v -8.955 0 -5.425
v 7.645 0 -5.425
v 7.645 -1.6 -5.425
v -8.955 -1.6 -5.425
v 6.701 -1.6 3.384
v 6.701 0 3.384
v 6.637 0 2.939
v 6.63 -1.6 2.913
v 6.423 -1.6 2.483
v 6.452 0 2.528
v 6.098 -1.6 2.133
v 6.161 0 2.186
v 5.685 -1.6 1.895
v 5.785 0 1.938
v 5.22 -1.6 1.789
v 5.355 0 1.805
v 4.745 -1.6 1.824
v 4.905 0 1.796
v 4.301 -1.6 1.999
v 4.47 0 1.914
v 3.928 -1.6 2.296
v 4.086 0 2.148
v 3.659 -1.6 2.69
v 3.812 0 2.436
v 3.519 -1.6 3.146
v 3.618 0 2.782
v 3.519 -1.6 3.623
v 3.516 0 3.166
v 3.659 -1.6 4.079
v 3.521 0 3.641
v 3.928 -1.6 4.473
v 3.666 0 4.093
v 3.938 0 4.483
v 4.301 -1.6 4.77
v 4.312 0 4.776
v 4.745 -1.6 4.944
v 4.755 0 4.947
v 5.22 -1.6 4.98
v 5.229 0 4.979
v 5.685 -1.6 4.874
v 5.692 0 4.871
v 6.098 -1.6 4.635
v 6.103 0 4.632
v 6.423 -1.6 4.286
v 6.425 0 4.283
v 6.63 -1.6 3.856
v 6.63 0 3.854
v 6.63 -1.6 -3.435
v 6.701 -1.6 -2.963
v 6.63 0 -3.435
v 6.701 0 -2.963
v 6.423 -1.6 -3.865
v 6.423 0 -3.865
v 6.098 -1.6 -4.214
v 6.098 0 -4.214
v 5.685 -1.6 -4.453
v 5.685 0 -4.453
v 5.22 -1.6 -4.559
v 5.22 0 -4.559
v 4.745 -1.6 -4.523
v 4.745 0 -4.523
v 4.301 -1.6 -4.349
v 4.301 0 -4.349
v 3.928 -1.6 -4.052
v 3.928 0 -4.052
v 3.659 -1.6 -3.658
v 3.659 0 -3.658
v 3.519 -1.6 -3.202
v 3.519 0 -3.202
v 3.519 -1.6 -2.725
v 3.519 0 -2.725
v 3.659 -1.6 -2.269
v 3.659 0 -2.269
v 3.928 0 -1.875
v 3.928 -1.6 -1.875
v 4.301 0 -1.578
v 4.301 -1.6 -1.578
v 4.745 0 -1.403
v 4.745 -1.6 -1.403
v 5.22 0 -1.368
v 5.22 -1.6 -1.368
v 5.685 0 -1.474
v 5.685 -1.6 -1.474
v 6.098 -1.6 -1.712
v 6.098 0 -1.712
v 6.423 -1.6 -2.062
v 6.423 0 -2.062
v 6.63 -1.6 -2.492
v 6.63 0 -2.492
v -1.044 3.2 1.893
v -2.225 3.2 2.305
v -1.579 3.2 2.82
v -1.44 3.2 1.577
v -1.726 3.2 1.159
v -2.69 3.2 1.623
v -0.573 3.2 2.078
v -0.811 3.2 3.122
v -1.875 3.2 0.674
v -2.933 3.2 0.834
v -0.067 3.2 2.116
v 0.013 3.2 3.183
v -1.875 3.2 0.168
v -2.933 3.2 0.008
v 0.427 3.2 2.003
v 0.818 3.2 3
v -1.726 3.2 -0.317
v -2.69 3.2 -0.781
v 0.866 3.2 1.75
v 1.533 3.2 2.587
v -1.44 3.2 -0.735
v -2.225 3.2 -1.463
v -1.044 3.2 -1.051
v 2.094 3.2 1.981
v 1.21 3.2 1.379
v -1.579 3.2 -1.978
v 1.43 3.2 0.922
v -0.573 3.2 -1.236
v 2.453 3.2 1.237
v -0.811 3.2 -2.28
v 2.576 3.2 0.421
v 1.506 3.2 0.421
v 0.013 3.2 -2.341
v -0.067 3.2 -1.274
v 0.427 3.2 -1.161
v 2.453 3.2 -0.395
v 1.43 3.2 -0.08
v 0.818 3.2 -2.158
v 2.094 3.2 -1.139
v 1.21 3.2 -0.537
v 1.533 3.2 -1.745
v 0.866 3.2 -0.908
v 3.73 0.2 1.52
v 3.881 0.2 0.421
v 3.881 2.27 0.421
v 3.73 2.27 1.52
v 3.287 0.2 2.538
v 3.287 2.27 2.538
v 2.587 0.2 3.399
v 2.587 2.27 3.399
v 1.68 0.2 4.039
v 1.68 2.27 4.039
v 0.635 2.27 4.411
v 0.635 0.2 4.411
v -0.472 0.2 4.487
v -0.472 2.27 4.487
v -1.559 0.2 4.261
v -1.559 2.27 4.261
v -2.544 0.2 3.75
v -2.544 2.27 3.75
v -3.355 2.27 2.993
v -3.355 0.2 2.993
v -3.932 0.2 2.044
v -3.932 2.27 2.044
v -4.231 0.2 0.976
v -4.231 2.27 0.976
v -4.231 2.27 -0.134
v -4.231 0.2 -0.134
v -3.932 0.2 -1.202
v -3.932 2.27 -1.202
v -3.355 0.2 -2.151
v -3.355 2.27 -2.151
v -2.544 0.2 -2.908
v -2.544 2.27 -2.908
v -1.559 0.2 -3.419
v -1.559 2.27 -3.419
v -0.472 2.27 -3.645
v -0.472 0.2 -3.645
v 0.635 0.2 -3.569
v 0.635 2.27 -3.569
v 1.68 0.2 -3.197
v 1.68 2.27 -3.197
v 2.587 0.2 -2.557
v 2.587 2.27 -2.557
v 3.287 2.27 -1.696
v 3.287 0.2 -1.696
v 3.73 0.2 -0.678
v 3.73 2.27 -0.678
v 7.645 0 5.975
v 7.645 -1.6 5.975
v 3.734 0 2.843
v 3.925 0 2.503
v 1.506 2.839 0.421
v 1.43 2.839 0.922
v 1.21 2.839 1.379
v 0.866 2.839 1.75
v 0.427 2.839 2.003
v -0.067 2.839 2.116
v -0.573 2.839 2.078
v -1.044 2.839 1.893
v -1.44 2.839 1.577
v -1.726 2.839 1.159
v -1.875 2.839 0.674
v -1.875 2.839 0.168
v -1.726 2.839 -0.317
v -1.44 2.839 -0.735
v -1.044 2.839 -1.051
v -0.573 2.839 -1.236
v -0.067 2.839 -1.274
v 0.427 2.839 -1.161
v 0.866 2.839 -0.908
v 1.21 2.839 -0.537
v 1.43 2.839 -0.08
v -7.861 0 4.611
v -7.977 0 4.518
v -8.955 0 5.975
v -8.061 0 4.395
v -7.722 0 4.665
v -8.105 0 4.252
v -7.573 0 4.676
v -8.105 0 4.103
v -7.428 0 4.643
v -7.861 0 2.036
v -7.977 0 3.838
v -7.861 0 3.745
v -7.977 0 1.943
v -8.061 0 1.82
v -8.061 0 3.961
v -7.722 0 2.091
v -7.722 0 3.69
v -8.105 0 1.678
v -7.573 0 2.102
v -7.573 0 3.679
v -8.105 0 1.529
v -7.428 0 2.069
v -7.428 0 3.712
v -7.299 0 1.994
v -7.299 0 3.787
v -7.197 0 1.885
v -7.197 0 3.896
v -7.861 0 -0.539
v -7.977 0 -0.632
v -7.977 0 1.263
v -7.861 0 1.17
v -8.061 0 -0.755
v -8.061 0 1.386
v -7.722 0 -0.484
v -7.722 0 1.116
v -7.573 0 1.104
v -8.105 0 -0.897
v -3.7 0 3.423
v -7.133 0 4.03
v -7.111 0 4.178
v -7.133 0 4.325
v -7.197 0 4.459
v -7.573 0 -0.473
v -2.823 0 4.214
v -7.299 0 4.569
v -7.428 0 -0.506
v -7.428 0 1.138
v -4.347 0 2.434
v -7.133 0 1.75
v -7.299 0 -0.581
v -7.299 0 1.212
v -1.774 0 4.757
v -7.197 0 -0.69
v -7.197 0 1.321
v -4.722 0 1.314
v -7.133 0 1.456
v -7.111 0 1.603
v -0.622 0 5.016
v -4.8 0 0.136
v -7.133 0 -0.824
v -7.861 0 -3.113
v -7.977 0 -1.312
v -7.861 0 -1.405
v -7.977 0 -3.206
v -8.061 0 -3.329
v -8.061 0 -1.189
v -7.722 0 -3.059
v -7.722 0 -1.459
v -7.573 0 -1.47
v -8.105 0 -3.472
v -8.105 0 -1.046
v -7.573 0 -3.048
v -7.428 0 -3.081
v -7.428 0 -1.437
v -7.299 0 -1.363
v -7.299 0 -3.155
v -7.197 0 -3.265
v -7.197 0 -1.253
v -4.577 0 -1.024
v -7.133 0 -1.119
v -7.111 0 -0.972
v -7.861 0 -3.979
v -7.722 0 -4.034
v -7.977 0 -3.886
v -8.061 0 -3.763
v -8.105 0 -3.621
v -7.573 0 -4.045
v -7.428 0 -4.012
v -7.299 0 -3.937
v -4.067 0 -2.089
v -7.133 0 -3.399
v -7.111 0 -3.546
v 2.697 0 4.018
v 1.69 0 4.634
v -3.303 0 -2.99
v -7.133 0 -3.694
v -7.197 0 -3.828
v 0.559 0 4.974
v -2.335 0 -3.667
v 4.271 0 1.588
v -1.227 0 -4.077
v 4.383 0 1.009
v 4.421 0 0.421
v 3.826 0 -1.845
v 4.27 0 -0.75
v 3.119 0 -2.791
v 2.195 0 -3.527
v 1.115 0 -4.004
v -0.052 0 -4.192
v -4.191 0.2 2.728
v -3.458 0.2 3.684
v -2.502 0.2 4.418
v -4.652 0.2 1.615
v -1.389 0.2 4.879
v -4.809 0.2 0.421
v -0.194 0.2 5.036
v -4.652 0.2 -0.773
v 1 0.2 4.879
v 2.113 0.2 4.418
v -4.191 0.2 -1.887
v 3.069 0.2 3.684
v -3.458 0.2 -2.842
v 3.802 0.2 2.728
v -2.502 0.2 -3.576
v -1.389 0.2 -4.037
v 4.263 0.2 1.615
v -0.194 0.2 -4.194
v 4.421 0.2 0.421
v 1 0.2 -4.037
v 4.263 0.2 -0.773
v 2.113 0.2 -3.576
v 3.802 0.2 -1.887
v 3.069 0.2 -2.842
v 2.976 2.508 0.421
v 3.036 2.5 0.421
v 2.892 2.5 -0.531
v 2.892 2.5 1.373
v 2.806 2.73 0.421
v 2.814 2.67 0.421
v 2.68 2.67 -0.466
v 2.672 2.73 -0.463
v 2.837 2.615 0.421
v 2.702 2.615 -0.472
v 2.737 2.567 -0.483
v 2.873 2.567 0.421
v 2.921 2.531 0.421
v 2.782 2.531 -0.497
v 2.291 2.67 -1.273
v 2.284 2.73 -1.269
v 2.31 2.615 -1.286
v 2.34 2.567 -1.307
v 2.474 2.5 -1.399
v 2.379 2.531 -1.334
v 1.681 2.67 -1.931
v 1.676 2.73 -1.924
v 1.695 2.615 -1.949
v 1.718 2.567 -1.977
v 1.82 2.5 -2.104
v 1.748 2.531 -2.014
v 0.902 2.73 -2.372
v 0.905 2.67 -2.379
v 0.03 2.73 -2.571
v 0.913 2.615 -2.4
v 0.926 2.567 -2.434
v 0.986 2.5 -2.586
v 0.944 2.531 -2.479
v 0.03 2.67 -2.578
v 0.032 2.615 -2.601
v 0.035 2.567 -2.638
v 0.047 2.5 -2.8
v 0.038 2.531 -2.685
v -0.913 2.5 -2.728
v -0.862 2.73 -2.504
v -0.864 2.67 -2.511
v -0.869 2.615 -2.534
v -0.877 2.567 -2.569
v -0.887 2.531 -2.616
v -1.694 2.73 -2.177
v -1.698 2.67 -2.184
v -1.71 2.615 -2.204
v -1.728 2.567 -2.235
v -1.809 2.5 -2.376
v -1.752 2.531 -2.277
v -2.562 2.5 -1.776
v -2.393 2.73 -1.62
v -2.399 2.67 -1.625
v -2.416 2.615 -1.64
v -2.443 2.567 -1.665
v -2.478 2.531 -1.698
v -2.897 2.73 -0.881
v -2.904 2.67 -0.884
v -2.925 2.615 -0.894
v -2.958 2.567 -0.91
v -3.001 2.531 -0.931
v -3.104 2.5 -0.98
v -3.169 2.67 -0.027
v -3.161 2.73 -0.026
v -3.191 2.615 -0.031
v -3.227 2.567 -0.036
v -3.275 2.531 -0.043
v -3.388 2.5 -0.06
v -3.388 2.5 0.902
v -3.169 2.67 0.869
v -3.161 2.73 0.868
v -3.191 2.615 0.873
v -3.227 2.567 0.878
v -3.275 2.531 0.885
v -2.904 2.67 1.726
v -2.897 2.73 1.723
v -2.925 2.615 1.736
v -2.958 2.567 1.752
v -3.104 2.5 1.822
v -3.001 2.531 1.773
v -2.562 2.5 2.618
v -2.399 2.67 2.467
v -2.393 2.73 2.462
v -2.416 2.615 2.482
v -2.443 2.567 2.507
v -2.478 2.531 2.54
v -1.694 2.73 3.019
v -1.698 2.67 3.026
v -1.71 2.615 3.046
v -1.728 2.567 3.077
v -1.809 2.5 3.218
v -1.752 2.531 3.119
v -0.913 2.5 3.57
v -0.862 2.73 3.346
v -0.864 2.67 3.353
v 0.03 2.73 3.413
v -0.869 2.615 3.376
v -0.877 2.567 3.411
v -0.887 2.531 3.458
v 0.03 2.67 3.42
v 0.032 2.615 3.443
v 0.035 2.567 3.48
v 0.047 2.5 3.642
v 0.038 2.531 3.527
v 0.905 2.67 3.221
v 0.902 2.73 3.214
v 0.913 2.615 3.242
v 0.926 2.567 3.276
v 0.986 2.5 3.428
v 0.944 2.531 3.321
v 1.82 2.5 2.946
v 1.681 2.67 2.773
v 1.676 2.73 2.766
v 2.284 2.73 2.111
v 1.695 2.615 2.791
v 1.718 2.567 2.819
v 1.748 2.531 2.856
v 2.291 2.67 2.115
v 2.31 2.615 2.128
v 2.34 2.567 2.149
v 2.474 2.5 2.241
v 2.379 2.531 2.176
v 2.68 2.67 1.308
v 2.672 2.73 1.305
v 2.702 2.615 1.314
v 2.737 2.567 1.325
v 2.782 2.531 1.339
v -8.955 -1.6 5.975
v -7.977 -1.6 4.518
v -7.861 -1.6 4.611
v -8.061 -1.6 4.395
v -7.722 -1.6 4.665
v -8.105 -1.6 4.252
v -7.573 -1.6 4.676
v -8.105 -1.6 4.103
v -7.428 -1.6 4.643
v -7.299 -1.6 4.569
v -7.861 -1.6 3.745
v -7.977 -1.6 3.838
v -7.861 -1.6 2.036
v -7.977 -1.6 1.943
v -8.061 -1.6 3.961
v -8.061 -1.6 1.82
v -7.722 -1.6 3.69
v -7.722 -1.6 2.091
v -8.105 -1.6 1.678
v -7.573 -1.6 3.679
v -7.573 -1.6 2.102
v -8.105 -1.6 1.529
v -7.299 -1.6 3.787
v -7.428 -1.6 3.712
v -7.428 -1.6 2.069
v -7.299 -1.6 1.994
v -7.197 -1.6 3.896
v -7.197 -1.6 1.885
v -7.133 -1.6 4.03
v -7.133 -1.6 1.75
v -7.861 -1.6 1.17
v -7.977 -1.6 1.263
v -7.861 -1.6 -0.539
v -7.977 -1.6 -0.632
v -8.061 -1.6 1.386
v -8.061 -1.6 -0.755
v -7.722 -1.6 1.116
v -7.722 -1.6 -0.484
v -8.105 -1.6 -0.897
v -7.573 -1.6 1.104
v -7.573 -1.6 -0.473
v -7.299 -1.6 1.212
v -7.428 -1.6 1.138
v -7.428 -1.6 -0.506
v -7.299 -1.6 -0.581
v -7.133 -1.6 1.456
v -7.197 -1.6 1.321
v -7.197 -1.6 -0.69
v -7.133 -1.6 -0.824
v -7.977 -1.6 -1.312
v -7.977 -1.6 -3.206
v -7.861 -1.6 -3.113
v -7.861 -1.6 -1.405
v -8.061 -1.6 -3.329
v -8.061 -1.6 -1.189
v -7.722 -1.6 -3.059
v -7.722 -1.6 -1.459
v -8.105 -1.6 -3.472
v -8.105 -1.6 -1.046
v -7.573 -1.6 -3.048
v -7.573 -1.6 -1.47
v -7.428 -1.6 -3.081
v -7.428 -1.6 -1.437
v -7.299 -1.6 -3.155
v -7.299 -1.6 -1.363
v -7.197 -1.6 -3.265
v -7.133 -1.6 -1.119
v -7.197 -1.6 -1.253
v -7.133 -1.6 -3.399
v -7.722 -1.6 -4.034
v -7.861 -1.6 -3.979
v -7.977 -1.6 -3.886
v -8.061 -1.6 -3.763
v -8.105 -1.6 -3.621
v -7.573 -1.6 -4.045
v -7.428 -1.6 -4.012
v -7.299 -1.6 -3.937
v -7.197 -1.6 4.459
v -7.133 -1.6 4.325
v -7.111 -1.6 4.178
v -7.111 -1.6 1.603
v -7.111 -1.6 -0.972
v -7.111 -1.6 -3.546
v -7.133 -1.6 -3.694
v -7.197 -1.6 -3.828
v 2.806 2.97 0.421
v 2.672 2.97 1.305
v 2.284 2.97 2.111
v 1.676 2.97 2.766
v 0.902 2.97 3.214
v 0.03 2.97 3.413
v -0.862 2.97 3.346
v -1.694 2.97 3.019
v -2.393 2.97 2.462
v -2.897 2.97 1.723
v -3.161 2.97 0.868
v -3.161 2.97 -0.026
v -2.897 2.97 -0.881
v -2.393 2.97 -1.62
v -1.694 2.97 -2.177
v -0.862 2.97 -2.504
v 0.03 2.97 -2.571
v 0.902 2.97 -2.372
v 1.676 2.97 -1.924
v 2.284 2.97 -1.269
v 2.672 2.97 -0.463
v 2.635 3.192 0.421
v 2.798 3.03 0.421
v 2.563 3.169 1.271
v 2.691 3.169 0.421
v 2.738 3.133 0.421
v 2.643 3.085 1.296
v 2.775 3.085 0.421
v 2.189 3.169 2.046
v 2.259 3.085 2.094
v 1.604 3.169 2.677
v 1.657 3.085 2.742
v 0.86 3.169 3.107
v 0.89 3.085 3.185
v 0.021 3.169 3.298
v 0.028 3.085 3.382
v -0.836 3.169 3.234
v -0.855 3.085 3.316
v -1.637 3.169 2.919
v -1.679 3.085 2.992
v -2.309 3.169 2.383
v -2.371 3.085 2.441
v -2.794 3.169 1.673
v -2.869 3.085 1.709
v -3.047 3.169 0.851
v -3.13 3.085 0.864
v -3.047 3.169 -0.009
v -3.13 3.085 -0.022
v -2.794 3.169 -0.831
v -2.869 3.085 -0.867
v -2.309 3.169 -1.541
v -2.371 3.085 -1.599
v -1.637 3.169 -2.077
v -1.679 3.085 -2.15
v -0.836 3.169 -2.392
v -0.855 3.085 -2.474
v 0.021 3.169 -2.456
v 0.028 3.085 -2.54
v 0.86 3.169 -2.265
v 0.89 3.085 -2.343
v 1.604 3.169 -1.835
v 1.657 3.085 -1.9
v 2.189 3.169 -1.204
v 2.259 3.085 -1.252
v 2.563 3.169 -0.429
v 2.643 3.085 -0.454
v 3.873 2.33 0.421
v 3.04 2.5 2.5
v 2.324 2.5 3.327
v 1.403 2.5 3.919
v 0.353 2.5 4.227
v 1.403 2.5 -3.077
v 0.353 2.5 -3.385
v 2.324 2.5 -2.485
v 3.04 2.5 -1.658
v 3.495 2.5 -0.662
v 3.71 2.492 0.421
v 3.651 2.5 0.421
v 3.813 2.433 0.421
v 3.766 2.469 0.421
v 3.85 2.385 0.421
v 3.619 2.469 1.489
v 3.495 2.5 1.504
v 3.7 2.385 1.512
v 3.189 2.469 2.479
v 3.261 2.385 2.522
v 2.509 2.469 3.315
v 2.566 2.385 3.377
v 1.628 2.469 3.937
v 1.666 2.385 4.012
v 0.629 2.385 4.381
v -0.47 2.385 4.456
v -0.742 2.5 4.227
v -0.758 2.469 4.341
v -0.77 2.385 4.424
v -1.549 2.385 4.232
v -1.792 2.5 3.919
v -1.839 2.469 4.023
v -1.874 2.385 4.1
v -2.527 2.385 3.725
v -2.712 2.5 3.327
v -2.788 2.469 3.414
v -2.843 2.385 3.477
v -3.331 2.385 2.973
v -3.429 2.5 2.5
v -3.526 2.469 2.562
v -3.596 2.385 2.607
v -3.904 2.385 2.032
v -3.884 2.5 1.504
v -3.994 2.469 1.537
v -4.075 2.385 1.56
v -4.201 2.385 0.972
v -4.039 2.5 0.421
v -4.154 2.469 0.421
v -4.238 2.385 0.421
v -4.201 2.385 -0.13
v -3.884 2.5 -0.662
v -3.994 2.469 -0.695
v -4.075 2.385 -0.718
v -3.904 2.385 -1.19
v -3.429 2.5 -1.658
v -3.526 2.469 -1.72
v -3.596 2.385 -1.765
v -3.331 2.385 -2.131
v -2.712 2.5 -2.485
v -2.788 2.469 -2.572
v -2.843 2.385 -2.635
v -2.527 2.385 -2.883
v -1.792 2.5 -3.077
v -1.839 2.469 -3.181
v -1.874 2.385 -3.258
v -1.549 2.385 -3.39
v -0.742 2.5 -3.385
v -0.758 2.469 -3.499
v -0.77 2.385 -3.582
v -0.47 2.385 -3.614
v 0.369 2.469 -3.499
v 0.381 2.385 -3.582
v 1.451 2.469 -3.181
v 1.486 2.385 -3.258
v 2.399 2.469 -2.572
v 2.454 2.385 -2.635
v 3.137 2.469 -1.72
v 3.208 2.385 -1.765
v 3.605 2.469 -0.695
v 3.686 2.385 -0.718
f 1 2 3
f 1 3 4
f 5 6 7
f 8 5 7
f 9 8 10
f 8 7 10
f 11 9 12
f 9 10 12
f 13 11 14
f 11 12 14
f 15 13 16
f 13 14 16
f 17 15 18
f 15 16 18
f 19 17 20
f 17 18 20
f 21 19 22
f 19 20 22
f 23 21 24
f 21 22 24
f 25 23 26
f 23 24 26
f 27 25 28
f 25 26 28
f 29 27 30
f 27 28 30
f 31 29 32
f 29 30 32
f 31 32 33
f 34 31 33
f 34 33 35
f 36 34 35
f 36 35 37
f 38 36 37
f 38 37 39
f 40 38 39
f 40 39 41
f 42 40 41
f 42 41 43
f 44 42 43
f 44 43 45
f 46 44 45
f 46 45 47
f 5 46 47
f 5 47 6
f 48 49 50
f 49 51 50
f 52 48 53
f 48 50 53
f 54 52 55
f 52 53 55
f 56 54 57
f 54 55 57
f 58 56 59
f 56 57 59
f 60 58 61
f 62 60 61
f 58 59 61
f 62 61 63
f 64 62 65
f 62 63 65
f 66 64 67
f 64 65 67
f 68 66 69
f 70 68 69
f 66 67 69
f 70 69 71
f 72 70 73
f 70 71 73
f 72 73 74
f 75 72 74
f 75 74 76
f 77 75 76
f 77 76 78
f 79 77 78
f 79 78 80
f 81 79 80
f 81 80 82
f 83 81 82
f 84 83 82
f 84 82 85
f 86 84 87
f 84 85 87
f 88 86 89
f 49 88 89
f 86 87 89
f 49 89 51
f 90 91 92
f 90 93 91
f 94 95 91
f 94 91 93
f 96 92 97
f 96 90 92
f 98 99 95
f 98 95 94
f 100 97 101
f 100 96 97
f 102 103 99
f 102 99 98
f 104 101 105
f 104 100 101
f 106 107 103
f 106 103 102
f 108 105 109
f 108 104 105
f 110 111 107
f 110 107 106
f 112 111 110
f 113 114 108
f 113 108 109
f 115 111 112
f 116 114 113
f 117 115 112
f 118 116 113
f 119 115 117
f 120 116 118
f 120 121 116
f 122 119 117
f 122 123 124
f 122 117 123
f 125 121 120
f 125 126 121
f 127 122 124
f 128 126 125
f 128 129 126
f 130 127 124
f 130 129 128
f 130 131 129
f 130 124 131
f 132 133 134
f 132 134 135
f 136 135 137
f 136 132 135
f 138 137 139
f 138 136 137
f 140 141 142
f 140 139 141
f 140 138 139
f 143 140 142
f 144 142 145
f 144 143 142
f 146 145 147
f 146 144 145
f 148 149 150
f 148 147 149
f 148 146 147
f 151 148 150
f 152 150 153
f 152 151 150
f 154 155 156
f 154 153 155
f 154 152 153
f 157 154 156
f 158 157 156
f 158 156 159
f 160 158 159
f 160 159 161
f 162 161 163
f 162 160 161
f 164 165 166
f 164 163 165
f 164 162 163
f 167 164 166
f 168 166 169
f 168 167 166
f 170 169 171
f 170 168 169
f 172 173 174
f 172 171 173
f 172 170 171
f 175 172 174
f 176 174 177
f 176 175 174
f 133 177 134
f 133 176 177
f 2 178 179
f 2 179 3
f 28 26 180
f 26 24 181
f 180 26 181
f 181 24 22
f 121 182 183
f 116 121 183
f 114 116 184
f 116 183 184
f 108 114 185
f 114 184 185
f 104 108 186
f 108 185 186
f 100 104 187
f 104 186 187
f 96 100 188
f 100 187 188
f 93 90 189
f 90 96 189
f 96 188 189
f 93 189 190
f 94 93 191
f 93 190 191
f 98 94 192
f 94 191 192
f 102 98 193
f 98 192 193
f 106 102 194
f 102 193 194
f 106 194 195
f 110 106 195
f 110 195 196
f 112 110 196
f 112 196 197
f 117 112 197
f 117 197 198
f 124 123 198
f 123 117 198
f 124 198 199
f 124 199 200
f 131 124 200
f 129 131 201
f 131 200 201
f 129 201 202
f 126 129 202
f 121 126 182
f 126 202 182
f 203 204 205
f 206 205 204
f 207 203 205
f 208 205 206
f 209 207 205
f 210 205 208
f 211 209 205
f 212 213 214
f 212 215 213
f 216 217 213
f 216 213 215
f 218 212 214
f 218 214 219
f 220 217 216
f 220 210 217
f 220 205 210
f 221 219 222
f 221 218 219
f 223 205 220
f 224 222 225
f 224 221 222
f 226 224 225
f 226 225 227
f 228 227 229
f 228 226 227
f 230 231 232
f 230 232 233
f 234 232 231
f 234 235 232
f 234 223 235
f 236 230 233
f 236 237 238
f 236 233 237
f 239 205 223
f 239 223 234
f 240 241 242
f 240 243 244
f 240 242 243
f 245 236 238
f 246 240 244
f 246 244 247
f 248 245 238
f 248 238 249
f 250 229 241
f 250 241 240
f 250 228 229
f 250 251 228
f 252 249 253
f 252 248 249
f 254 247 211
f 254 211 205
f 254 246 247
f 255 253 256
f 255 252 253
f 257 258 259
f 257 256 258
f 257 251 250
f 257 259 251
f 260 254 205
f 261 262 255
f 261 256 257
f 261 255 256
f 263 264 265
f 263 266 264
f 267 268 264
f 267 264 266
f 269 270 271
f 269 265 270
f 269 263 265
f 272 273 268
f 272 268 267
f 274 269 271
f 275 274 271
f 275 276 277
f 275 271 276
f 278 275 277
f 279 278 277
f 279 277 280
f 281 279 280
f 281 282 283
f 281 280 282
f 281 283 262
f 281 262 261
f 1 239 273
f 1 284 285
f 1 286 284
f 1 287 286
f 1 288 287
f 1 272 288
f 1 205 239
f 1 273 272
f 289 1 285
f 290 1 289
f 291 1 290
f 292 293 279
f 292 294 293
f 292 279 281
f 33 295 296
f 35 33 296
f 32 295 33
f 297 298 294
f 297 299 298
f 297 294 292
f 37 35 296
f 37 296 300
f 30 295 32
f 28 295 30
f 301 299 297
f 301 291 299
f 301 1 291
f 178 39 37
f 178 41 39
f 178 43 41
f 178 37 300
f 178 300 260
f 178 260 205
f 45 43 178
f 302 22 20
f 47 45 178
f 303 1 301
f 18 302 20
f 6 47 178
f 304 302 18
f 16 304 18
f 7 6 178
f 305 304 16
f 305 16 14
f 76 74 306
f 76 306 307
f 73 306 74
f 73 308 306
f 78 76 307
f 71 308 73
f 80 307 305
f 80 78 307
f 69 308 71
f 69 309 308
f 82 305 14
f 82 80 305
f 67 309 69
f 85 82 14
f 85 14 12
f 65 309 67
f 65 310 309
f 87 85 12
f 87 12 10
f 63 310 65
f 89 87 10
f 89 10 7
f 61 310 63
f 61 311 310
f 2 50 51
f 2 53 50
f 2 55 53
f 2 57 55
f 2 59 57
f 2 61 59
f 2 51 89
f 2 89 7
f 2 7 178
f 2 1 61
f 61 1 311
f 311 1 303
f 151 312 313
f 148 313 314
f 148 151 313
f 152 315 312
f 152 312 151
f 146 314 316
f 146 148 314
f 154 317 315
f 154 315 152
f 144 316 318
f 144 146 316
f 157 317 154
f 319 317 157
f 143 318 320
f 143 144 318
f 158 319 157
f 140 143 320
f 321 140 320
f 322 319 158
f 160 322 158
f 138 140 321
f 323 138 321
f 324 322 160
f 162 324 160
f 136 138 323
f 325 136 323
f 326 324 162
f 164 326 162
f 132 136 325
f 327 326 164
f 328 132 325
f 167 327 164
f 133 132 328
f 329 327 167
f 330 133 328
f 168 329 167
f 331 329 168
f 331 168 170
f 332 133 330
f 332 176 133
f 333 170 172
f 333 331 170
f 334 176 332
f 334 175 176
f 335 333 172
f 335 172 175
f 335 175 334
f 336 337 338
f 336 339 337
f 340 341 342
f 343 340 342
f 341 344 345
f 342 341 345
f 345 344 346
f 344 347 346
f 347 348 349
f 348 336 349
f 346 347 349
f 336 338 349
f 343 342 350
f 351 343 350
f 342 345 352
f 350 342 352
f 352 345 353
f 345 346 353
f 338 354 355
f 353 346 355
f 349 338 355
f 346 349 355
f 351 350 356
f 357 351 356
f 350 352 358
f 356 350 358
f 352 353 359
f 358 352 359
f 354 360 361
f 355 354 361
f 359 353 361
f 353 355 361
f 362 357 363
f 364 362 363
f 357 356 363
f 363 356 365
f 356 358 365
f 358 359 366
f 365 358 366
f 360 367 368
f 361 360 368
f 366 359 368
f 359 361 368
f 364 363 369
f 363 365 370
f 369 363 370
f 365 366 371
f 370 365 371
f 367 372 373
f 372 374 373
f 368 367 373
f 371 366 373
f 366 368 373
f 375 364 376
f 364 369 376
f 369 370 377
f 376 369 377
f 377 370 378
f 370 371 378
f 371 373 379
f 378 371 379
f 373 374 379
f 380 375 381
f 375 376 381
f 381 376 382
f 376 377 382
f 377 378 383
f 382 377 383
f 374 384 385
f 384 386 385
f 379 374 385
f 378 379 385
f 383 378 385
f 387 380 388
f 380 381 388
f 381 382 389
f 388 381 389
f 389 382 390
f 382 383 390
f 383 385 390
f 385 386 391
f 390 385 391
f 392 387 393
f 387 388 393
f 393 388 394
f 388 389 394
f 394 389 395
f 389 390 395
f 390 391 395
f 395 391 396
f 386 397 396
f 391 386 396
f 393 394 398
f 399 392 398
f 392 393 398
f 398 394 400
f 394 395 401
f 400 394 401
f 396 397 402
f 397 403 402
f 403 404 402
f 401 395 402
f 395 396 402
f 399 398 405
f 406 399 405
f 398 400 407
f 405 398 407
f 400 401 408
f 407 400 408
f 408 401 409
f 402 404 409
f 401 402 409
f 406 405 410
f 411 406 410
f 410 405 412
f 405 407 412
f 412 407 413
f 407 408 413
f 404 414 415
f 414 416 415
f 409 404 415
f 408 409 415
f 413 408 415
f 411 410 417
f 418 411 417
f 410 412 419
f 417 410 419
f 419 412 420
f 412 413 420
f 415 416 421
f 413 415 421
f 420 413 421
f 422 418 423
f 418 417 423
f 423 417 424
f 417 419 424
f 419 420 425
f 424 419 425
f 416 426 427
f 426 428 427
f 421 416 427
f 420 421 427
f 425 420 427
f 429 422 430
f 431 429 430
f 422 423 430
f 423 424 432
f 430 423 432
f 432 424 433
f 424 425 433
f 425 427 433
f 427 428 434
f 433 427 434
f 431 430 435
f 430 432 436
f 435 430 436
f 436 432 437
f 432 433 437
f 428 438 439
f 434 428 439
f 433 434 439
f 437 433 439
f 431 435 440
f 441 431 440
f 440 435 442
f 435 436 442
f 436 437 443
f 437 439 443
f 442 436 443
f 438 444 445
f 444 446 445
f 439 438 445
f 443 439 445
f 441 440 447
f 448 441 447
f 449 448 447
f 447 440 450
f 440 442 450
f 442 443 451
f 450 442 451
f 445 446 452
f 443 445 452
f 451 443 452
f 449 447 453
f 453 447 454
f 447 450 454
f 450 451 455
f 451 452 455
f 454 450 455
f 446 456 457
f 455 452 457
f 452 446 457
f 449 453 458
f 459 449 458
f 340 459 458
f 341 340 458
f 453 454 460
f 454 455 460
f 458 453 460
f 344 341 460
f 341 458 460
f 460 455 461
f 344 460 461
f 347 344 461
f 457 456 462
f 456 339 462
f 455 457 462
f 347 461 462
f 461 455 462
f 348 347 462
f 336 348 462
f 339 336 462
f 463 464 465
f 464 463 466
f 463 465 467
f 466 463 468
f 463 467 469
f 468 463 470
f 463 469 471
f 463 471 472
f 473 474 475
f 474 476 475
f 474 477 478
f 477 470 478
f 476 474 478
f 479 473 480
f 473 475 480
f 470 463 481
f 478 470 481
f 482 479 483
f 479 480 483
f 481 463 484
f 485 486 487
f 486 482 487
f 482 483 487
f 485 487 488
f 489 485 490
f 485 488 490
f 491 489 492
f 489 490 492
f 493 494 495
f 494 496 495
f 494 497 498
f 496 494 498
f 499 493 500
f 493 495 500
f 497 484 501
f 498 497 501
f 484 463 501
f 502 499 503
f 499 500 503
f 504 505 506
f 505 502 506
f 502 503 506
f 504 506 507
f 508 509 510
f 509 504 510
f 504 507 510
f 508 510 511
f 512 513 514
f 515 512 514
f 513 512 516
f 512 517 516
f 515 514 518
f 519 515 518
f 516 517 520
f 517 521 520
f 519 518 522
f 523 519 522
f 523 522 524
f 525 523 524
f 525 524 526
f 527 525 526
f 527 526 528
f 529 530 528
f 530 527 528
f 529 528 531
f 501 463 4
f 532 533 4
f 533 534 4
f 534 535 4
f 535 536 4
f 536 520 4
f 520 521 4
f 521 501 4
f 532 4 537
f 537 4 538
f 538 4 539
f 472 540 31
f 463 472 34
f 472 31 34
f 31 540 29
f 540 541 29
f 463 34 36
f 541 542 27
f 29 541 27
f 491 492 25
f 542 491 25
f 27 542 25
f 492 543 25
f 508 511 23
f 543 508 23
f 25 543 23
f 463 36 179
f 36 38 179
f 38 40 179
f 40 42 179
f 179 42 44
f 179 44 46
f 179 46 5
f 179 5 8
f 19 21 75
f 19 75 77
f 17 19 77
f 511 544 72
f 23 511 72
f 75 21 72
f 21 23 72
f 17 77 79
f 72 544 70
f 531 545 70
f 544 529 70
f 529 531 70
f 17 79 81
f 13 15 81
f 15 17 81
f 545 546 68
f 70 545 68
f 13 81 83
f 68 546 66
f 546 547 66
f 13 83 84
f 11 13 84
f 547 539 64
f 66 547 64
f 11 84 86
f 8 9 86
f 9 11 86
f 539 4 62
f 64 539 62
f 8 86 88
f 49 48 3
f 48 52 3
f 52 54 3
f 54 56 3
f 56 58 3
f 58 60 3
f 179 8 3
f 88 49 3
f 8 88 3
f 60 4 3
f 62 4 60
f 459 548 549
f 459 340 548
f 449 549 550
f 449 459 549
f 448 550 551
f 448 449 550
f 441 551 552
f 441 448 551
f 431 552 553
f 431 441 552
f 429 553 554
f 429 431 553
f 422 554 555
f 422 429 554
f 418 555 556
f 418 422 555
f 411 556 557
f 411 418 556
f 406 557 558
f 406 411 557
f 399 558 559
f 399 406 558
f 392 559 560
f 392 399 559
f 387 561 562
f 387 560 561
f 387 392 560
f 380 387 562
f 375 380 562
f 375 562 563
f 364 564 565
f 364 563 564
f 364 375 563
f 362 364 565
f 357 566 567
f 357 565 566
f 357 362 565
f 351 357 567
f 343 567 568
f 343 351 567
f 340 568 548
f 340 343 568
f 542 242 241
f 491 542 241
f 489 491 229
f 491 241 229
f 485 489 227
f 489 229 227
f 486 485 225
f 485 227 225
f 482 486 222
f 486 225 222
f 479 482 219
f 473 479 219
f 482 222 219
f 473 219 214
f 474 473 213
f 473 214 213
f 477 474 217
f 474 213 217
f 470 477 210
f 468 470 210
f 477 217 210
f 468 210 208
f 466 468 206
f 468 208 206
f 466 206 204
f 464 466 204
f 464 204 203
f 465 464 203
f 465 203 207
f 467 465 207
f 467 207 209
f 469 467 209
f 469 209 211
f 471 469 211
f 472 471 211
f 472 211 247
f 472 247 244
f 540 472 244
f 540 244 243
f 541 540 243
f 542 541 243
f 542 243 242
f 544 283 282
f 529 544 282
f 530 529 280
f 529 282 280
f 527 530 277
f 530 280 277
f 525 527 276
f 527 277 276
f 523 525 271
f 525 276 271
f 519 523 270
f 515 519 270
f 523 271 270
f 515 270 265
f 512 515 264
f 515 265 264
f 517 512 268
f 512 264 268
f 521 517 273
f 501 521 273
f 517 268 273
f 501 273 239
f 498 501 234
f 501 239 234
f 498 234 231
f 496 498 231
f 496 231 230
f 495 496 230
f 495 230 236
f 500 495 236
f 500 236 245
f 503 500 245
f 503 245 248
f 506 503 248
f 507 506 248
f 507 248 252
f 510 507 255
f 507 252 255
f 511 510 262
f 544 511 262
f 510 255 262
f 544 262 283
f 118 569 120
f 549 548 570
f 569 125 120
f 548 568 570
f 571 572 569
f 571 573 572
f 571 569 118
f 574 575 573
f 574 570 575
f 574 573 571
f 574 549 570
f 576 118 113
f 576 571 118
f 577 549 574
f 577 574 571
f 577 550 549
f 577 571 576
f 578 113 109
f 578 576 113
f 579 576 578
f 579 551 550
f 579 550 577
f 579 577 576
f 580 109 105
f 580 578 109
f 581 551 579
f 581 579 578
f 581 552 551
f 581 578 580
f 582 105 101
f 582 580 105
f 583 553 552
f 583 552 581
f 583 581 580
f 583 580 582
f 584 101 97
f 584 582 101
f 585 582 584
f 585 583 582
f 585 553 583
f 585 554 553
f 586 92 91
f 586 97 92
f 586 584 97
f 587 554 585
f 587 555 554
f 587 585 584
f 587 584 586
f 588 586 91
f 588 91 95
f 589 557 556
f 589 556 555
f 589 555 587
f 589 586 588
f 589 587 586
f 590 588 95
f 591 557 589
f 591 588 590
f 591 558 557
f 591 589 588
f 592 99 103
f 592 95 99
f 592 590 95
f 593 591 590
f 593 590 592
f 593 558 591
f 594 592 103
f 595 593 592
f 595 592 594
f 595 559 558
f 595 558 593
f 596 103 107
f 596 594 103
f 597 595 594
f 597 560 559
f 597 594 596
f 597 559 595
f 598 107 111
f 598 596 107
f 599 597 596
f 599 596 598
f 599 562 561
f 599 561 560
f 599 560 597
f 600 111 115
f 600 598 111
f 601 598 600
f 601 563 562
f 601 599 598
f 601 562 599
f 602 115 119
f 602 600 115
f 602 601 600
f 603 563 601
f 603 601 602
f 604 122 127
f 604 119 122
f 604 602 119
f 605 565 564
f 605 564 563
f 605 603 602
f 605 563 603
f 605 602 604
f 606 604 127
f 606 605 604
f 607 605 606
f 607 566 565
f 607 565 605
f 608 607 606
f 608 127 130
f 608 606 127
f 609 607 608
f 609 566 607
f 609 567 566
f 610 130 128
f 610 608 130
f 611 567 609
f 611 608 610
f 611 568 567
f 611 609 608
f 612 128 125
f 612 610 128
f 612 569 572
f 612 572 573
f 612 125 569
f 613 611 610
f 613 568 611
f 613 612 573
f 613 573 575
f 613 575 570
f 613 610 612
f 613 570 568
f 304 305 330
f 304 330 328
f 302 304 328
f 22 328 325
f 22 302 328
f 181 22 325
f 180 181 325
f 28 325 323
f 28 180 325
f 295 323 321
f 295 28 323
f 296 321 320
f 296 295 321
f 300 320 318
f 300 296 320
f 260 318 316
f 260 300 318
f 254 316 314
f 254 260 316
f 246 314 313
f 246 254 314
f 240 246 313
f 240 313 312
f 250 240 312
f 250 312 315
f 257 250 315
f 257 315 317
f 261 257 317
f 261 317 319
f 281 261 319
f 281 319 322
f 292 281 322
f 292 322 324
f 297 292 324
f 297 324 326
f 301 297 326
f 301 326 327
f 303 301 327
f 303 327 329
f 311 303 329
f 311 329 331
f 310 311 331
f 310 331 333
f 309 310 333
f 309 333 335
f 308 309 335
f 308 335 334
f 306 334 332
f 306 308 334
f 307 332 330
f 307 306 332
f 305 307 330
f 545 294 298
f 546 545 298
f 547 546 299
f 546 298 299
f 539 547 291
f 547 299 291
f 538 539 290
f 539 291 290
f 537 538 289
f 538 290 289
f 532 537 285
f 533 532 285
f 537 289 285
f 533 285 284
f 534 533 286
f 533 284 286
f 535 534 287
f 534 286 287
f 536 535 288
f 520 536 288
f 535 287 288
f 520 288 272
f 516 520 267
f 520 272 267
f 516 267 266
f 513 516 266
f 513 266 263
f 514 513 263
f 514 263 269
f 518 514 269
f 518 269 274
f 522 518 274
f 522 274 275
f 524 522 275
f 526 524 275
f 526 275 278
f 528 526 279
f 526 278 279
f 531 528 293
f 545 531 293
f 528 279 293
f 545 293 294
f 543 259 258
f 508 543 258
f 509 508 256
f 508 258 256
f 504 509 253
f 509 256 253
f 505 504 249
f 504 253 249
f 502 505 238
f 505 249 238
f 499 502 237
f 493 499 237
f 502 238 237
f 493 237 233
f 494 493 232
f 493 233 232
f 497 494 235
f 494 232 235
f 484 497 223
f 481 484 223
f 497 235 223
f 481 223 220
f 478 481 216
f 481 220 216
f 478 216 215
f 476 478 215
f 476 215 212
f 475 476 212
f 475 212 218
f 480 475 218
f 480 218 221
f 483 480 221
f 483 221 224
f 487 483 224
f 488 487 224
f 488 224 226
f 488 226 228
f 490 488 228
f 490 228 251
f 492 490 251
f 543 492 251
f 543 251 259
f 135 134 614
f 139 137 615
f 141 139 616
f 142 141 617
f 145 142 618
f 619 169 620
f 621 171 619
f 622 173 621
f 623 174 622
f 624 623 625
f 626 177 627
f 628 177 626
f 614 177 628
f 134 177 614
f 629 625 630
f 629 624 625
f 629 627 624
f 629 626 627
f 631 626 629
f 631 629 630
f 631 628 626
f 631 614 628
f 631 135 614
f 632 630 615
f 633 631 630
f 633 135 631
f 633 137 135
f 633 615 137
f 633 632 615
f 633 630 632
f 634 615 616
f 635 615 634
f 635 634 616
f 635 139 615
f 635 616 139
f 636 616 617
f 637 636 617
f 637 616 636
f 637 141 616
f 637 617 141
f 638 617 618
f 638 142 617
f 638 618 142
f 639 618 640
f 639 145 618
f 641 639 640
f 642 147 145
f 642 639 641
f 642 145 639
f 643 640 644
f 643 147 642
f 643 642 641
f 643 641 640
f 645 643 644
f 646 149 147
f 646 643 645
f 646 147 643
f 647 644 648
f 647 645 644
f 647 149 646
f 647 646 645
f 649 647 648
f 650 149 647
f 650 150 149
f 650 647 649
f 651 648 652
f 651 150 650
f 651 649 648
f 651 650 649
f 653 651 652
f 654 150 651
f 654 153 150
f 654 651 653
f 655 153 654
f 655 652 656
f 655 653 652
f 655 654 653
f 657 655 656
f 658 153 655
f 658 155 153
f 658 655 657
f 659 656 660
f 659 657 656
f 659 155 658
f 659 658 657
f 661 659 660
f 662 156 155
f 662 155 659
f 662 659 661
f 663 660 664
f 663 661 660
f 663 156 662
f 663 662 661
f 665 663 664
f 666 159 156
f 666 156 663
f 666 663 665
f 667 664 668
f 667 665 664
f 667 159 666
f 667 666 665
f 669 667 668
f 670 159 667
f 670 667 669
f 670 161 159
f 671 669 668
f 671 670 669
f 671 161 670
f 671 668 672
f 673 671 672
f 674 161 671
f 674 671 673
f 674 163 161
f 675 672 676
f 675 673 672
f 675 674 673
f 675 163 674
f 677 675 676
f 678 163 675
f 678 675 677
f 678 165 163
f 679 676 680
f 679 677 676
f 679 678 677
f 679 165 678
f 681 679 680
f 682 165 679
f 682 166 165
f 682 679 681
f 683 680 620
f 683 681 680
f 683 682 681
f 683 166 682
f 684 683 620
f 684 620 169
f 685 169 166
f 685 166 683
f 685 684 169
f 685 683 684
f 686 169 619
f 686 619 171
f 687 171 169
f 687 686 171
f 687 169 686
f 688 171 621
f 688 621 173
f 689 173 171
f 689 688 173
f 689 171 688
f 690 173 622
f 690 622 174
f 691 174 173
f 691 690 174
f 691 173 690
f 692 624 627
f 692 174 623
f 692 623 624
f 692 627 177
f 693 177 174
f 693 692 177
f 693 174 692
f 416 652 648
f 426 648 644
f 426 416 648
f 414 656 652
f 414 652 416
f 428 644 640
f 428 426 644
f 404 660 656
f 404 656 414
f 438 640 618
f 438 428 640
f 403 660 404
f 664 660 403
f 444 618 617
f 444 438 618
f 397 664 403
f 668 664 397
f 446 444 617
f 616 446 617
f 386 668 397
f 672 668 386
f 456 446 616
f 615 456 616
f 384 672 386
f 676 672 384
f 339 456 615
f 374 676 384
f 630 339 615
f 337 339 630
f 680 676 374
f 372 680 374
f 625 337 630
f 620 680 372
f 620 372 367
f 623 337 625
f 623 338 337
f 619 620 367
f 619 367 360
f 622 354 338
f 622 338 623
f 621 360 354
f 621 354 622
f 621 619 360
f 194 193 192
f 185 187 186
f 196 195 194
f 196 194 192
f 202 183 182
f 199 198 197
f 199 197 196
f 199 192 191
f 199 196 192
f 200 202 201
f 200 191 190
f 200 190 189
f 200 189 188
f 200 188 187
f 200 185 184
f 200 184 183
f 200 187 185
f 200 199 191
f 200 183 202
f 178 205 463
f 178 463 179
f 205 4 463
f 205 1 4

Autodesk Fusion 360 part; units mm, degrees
sketch "Sketch1" plane through (0, 0, 0) normal (0, 1, 0) x (1, 0, 0)
  line L0 (-8.9546, -5.9752) -> (7.6454, -5.9752)
  line L1 (7.6454, -5.9752) -> (7.6454, 5.4248)
  line L2 (7.6454, 5.4248) -> (-8.9546, 5.4248)
  line L3 (-8.9546, 5.4248) -> (-8.9546, -5.9752)
  circle A0 centre (-7.6106, 3.5462) radius 0.5
  circle A1 centre (-7.6106, 0.9716) radius 0.5
  circle A2 centre (-7.6106, -1.6031) radius 0.5
  circle A3 centre (-7.6106, -4.1778) radius 0.5
  circle A4 centre (-0.1943, -0.421) radius 4.615
  circle A5 centre (-0.1943, -0.421) radius 4.075
  circle A6 centre (-0.1943, -0.421) radius 3
  circle A7 centre (-0.1943, -0.421) radius 1.7
  circle A8 centre (5.1007, 2.9633) radius 1.6
  circle A9 centre (5.1007, -3.3843) radius 1.6
  dimension "d1" = 16.6
  dimension "d2" = 11.4
  dimension "d3" = 1
  dimension "d6" = 0
  dimension "d7" = -7.724
  dimension "d8" = 9.23
  dimension "d9" = 8.15
  dimension "d10" = 6
  dimension "d11" = 3.4
  dimension "d12" = 3.2
  dimension "d13" = 3.2
extrude "Extrude1" add sketch "Sketch1" against normal blind 1.6 contours L0 L1 L2 L3 | A4 A9 | A5 | A6 | A7 picked at (3.1257, -3.3478)
extrude "Extrude2" add sketch "Sketch1" along normal blind 0.2 contours A4 A9 | A4 A9 picked at (3.1257, -3.3478) picked at (3.7696, -2.6849)
extrude "Extrude3" add sketch "Sketch1" along normal blind 2.5 contours A5
extrude "Extrude4" add sketch "Sketch1" along normal blind 3.2 contours A6
extrude "Extrude5" add sketch "Sketch1" along normal blind 2.839 contours A7
fillet "Fillet1" radius 0.23 3 edges at (-2.9913, 3.2, 1.5059) (-2.9913, 2.5, -0.6638) (-3.9935, 2.5, 1.8946)
